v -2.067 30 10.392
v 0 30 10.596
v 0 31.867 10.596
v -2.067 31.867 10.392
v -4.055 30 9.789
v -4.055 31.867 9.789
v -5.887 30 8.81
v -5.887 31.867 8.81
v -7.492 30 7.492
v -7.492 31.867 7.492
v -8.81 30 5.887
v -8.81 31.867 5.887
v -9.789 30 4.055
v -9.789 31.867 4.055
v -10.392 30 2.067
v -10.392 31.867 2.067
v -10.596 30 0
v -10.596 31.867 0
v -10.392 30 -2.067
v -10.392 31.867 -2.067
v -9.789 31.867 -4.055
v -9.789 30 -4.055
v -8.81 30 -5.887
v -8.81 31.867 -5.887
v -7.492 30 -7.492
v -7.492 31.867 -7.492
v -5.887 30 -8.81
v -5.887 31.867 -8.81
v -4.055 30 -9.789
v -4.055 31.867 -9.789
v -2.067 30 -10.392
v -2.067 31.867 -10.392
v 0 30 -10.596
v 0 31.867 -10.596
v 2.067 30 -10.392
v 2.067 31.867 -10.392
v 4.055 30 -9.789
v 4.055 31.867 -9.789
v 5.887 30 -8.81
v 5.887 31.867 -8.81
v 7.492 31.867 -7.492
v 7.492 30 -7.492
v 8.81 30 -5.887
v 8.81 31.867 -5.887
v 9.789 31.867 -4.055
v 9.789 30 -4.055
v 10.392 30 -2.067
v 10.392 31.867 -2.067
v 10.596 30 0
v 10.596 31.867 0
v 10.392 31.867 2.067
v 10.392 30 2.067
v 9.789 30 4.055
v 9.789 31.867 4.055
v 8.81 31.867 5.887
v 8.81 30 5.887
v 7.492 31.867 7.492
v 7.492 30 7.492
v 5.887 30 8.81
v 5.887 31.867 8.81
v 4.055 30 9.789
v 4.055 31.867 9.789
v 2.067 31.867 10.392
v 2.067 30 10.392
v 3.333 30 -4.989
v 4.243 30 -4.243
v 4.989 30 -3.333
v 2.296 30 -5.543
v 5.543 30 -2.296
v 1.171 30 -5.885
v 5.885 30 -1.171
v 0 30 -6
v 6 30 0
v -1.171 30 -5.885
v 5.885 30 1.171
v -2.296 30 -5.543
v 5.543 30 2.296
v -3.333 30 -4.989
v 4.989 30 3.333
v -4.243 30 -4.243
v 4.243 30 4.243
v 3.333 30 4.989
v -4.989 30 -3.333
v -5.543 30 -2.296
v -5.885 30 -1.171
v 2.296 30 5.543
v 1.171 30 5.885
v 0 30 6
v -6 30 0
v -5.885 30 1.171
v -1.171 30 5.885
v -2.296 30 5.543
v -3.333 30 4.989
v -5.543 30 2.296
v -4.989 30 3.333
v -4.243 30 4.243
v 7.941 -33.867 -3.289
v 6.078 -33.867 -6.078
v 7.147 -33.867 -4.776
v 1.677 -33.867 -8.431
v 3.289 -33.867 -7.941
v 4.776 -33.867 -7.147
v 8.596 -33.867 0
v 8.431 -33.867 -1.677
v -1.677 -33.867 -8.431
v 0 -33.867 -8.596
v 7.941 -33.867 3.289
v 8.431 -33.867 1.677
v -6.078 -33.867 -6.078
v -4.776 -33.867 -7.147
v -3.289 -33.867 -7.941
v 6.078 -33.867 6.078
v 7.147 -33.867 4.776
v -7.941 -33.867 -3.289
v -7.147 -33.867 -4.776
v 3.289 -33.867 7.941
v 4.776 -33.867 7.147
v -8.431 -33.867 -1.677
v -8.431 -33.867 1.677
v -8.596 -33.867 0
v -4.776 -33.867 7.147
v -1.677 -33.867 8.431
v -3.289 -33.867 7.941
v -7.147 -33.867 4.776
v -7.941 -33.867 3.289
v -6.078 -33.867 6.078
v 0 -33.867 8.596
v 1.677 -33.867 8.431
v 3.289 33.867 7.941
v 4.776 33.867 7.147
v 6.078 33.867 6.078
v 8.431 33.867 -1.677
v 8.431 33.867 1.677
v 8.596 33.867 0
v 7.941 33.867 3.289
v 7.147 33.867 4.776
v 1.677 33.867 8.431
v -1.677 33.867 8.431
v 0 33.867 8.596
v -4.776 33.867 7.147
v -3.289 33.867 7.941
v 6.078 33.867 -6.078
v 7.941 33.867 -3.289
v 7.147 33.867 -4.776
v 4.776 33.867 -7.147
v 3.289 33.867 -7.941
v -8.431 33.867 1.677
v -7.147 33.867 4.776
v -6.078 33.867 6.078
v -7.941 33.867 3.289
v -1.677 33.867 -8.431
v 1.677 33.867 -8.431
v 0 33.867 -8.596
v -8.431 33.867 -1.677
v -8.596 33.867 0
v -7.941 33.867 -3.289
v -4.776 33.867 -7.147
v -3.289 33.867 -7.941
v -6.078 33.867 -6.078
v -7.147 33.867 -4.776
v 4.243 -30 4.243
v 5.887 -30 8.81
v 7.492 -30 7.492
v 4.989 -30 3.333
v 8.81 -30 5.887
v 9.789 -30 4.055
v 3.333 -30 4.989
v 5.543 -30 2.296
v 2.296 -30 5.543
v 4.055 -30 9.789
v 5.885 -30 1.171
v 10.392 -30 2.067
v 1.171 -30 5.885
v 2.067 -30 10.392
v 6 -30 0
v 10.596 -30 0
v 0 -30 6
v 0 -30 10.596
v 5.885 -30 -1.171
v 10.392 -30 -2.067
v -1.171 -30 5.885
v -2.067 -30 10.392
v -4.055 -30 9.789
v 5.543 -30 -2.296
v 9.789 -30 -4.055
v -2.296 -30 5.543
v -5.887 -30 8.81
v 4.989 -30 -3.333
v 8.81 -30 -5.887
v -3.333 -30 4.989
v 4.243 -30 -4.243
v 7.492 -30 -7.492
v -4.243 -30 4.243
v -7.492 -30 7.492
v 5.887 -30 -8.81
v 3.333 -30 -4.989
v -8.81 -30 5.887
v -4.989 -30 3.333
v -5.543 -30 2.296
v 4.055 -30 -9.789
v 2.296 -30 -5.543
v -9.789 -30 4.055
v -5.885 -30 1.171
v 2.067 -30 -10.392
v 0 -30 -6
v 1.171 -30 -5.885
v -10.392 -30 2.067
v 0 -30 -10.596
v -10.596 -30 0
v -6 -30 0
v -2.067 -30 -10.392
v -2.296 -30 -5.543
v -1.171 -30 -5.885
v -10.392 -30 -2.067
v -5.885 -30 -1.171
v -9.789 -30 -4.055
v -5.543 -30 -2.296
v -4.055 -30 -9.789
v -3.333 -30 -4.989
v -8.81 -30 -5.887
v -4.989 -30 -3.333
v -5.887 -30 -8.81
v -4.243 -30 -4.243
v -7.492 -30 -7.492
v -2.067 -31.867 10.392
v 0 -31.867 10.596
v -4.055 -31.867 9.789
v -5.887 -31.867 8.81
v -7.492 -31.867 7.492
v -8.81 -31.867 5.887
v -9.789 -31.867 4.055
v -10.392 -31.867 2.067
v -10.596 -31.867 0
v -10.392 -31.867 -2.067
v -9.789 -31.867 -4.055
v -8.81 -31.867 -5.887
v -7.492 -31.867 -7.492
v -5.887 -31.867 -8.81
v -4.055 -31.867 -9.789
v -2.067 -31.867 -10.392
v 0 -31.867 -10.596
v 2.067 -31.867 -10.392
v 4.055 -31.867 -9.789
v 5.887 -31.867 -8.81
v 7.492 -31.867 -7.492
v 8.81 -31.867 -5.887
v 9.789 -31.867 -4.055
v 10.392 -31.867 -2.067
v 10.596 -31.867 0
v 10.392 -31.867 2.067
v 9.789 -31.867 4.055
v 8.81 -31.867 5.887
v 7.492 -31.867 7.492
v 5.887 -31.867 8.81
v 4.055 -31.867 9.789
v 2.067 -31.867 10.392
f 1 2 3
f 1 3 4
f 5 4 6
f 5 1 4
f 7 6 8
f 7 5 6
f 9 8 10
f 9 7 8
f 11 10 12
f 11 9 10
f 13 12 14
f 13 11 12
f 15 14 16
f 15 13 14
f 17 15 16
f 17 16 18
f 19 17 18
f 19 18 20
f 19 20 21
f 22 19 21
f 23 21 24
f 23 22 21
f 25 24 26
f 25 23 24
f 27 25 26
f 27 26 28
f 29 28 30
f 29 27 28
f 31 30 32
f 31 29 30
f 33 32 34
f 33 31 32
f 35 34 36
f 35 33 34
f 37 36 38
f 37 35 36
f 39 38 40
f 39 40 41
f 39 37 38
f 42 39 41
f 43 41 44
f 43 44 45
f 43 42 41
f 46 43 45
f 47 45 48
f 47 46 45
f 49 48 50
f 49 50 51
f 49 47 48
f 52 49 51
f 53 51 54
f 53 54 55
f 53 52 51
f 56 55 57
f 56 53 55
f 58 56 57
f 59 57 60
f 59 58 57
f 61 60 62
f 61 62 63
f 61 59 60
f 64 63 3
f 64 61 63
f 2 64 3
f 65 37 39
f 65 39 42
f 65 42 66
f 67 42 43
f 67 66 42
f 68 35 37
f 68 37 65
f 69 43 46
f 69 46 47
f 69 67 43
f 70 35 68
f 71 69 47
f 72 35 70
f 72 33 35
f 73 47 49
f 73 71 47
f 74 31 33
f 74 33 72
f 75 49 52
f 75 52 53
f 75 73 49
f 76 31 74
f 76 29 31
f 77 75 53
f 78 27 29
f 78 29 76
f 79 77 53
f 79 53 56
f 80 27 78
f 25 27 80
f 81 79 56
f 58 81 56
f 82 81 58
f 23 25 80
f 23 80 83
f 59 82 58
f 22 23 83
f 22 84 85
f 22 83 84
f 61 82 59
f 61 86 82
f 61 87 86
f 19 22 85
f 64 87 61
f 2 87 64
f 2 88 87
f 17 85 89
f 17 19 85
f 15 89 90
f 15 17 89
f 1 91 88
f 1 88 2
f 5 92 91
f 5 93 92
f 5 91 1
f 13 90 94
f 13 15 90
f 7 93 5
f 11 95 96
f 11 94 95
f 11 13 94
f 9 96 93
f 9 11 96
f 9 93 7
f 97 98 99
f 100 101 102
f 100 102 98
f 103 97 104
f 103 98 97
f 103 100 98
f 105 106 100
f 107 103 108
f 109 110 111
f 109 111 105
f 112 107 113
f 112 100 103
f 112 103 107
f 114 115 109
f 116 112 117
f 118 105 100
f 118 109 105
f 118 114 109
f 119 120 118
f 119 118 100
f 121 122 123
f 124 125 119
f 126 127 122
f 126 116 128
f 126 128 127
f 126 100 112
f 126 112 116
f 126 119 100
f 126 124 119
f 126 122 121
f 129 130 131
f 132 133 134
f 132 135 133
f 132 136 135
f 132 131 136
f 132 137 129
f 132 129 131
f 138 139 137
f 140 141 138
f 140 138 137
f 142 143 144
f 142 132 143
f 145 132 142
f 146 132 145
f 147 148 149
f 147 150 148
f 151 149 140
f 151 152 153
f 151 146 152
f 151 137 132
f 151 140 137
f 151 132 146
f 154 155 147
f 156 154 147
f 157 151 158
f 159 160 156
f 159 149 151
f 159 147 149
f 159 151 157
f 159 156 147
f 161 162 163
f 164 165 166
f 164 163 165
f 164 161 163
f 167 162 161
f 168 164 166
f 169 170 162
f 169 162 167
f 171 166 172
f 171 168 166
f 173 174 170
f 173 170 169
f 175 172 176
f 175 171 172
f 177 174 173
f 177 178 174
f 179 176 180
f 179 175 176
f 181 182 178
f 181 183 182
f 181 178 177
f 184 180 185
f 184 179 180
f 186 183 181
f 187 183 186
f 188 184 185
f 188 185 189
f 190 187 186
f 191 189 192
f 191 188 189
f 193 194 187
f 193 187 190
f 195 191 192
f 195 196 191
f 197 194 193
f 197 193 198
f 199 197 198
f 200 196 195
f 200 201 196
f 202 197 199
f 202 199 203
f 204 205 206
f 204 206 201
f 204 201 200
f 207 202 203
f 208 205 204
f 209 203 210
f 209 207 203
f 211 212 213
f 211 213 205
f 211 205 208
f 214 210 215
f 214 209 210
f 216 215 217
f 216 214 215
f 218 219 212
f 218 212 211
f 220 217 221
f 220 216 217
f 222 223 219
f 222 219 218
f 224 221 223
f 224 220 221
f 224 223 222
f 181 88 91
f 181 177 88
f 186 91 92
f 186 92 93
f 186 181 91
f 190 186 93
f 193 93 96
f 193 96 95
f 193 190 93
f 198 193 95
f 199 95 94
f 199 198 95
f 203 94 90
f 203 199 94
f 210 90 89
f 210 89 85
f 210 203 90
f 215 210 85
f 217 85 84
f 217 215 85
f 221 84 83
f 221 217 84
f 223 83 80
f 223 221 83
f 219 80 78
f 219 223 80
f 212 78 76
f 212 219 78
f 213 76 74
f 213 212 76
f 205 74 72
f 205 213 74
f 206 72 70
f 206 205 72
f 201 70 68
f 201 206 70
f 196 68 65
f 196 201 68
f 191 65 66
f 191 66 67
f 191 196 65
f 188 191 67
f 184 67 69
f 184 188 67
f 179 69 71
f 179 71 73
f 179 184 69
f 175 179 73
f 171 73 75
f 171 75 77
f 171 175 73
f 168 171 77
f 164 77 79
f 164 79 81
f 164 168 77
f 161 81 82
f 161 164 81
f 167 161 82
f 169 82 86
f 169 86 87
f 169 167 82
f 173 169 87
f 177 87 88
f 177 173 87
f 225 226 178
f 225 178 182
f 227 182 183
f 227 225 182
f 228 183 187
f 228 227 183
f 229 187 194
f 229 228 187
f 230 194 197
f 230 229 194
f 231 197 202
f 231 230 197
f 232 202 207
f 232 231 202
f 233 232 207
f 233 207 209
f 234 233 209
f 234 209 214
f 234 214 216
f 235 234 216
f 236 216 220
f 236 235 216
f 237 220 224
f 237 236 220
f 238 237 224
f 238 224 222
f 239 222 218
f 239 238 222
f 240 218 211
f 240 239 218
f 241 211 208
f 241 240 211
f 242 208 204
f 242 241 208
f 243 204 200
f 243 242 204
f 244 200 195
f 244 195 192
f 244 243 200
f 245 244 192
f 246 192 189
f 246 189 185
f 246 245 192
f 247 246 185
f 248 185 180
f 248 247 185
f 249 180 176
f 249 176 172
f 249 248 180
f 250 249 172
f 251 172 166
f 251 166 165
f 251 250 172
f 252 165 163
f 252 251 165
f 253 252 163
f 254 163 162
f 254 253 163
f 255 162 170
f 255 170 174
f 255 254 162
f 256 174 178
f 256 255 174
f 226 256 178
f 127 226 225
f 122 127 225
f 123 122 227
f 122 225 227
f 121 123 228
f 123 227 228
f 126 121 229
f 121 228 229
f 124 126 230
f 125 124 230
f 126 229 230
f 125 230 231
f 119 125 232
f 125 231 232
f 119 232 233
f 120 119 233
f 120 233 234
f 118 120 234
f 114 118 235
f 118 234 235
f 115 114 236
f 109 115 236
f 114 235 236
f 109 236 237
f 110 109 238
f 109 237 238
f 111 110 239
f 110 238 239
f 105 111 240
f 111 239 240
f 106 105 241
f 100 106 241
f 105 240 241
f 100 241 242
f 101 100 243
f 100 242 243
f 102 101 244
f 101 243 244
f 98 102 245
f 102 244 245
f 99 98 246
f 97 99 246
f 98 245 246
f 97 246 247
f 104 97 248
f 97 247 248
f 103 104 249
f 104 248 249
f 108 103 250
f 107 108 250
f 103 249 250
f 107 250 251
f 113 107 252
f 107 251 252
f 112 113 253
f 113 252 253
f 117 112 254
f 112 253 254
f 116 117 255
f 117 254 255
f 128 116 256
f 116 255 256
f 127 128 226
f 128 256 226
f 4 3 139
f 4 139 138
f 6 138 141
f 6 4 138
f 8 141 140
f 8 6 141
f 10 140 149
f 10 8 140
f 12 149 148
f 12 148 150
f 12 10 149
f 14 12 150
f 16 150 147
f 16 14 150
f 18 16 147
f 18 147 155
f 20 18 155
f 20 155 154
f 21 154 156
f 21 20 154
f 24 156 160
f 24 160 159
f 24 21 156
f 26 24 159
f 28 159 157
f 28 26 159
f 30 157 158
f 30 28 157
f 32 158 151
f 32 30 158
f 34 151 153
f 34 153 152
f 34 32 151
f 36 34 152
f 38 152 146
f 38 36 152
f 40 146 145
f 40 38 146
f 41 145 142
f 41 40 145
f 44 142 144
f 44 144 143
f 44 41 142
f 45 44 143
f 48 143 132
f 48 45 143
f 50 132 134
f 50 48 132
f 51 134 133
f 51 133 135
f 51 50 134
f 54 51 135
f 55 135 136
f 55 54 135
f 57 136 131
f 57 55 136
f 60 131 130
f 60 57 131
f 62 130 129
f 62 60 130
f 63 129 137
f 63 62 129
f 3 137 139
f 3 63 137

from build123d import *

# Parameters (mm, degrees)
F2_SIZE = 2


with BuildPart() as f1:
    # F0 (on Right) → F1 (revolve)
    with BuildSketch(Plane.YZ):
        Polygon((-33.866643, 10.595746), (-33.866643, 0), (0, 0), (33.866643, 0), (33.866643, 10.595746), (30, 10.595746), (30, 6), (0, 6), (-30, 6), (-30, 10.595746), align=None)
    revolve(axis=Axis((0, -16.933322, 0), (0, -1, 0)))

    # F2
    f2_edges = [f1.edges().sort_by_distance(p)[0] for p in [
        (0, -33.866643, -10.595746),
        (0, 33.866643, -10.595746),
    ]]
    chamfer(f2_edges, length=F2_SIZE)


solid = f1.part
